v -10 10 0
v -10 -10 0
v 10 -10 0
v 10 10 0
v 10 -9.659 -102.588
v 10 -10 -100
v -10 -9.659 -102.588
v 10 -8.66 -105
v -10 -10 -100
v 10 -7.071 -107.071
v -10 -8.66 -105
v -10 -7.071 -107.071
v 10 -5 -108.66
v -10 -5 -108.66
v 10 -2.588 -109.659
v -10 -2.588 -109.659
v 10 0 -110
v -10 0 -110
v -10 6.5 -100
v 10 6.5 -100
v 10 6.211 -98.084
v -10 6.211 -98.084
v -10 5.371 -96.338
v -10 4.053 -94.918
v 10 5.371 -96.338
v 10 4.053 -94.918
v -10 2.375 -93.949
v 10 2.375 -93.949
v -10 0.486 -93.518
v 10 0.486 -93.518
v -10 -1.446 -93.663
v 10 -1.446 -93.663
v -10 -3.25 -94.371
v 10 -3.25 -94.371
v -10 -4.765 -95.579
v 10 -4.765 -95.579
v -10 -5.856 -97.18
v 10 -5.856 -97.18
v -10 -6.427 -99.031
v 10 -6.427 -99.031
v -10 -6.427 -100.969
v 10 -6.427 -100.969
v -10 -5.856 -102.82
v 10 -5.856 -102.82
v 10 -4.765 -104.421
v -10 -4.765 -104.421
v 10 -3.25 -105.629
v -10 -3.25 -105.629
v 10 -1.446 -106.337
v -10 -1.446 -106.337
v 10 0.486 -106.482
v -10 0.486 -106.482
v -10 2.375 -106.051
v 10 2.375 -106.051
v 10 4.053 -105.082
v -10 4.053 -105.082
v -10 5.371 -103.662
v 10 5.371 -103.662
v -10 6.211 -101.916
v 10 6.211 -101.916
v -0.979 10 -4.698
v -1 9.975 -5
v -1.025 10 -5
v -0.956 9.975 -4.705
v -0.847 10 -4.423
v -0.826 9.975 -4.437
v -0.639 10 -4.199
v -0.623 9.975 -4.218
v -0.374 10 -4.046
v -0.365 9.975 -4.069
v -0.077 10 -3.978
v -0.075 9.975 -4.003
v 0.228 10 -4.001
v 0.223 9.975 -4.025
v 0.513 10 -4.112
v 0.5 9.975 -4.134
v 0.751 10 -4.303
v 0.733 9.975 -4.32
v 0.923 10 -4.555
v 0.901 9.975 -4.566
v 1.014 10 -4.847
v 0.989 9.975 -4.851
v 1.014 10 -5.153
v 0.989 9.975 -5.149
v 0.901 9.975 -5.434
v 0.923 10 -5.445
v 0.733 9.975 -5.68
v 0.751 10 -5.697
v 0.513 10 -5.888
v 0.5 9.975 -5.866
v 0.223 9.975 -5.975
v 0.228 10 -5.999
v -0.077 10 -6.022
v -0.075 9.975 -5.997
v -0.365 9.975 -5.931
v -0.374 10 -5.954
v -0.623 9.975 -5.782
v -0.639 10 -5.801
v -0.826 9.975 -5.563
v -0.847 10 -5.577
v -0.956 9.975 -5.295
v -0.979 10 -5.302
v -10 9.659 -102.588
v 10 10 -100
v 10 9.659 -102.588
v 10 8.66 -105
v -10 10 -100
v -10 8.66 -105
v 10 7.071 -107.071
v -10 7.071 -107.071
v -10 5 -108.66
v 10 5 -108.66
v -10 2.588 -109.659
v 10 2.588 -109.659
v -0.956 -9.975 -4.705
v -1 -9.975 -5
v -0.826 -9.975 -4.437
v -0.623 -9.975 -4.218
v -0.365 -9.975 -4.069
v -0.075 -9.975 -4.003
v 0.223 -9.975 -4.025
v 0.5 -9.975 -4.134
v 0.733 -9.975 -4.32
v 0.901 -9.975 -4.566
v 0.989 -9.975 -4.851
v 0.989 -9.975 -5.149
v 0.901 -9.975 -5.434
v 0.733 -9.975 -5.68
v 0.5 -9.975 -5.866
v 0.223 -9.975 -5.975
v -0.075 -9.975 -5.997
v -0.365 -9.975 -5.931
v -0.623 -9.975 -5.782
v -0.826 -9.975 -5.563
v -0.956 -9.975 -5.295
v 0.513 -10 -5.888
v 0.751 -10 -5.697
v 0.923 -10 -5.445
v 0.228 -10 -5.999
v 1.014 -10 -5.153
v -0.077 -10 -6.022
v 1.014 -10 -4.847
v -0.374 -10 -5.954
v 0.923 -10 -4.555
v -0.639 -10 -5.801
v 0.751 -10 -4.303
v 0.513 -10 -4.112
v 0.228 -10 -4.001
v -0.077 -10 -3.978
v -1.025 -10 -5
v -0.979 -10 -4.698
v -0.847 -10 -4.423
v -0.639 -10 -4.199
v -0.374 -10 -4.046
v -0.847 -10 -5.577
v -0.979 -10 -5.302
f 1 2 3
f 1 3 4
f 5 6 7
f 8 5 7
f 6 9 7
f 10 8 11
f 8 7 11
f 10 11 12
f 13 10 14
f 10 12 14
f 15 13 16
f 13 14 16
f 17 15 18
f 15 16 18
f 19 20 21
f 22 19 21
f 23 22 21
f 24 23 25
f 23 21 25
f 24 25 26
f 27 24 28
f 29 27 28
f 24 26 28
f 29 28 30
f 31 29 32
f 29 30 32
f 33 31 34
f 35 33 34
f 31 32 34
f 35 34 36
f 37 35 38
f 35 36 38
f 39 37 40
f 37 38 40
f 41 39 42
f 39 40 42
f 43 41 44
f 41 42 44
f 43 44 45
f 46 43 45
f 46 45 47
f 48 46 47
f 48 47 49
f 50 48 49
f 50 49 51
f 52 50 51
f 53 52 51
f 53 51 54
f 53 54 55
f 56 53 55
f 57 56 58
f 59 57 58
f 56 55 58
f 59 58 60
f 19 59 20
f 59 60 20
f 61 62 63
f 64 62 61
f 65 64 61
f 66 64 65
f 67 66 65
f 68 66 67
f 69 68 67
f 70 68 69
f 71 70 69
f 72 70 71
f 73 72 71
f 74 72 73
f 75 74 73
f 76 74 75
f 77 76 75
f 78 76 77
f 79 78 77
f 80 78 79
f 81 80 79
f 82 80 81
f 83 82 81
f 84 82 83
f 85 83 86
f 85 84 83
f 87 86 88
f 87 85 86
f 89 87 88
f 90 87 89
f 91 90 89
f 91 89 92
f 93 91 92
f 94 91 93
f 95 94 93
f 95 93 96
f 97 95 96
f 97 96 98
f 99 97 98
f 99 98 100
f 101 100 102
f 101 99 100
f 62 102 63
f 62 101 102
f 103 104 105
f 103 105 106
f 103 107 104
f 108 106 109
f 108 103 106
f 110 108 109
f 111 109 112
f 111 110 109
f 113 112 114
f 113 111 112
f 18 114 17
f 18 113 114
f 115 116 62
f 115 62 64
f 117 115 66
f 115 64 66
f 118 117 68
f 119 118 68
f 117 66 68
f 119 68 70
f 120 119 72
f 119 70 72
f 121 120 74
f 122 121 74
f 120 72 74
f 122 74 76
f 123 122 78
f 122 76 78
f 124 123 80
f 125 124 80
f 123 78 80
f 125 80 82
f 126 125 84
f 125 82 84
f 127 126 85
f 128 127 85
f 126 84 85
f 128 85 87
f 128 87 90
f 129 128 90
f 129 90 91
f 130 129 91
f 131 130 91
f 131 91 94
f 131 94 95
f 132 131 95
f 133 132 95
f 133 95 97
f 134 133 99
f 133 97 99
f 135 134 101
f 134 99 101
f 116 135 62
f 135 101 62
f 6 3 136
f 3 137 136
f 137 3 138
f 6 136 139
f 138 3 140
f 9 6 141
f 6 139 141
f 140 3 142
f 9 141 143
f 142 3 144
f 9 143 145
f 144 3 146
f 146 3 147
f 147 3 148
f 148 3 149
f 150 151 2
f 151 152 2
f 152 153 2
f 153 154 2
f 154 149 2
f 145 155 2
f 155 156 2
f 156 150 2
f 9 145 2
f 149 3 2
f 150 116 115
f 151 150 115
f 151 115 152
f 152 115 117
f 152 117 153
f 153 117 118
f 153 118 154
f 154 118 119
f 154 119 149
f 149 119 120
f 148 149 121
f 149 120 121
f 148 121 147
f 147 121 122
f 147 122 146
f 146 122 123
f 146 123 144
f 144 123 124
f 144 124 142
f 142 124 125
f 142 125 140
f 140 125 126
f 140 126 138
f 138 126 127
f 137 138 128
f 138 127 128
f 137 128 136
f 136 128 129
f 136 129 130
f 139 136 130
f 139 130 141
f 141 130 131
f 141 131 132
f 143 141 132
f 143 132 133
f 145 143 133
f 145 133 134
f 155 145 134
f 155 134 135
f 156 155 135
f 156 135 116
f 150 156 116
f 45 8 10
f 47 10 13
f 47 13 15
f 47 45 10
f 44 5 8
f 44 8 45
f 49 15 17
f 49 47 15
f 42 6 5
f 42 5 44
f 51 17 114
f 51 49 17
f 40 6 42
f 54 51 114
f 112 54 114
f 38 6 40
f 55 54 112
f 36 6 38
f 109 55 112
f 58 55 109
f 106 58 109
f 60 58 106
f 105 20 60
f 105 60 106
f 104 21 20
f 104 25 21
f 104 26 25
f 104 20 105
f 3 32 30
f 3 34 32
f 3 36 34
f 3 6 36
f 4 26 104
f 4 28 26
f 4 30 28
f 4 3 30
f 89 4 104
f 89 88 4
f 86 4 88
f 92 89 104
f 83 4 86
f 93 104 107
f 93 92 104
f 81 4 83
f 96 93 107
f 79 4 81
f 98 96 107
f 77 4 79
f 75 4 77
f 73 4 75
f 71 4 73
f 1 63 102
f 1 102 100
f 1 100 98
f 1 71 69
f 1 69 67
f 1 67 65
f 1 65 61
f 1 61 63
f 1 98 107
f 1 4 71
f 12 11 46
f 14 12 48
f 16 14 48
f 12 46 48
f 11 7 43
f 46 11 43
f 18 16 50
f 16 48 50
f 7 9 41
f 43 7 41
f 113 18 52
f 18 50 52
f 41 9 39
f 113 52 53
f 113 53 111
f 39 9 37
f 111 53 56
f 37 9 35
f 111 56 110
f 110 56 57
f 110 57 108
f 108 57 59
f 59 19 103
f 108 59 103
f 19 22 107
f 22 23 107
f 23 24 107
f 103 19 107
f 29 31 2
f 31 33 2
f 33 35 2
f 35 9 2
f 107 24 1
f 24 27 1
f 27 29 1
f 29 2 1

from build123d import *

# Parameters (mm, degrees)
SKETCH1_W                       = 20
SKETCH1_H                       = 20
BOSS_EXTRUDE1_DEPTH             = 110
FILLET1_R                       = 10
SKETCH2_R                       = 6.5
CUT_EXTRUDE1_DEPTH              = 20
F_2_0MM_DOWEL_HOLE1_D           = 2
F_2_0MM_DOWEL_HOLE1_CSINK_D     = 2.05
F_2_0MM_DOWEL_HOLE1_CSINK_ANGLE = 90


with BuildPart() as part:
    # Sketch1 → Boss-Extrude1 (new body)
    with BuildSketch(Plane(origin=(0, 0, 0), x_dir=(0, 1, 0), z_dir=(0, 0, 1))):
        Rectangle(SKETCH1_W, SKETCH1_H)
    extrude(amount=-BOSS_EXTRUDE1_DEPTH)

    # Fillet1
    fillet1_edges = [part.edges().sort_by_distance(p)[0] for p in [
        (0, -10, -110),
        (0, 10, -110),
    ]]
    fillet(fillet1_edges, radius=FILLET1_R - 0.0001)  # a hair under: the kernel refuses the full size

    # Sketch2 → Cut-Extrude1 (cut)
    with BuildSketch(Plane.YZ.offset(10)):
        with Locations((0, -100)):
            Circle(SKETCH2_R)
    extrude(amount=-CUT_EXTRUDE1_DEPTH, mode=Mode.SUBTRACT)

    # Ø2.0mm Dowel Hole1 (through all)
    with Locations(Plane.XZ.offset(10)):
        with Locations((0, -5)):
            f_2_0mm_dowel_hole1 = CounterSinkHole(F_2_0MM_DOWEL_HOLE1_D / 2, F_2_0MM_DOWEL_HOLE1_CSINK_D / 2, counter_sink_angle=F_2_0MM_DOWEL_HOLE1_CSINK_ANGLE)

    # Mirror1: Ø2.0mm Dowel Hole1 across plane
    add(f_2_0mm_dowel_hole1.mirror(Plane.ZX), mode=Mode.SUBTRACT)


solid = part.part
